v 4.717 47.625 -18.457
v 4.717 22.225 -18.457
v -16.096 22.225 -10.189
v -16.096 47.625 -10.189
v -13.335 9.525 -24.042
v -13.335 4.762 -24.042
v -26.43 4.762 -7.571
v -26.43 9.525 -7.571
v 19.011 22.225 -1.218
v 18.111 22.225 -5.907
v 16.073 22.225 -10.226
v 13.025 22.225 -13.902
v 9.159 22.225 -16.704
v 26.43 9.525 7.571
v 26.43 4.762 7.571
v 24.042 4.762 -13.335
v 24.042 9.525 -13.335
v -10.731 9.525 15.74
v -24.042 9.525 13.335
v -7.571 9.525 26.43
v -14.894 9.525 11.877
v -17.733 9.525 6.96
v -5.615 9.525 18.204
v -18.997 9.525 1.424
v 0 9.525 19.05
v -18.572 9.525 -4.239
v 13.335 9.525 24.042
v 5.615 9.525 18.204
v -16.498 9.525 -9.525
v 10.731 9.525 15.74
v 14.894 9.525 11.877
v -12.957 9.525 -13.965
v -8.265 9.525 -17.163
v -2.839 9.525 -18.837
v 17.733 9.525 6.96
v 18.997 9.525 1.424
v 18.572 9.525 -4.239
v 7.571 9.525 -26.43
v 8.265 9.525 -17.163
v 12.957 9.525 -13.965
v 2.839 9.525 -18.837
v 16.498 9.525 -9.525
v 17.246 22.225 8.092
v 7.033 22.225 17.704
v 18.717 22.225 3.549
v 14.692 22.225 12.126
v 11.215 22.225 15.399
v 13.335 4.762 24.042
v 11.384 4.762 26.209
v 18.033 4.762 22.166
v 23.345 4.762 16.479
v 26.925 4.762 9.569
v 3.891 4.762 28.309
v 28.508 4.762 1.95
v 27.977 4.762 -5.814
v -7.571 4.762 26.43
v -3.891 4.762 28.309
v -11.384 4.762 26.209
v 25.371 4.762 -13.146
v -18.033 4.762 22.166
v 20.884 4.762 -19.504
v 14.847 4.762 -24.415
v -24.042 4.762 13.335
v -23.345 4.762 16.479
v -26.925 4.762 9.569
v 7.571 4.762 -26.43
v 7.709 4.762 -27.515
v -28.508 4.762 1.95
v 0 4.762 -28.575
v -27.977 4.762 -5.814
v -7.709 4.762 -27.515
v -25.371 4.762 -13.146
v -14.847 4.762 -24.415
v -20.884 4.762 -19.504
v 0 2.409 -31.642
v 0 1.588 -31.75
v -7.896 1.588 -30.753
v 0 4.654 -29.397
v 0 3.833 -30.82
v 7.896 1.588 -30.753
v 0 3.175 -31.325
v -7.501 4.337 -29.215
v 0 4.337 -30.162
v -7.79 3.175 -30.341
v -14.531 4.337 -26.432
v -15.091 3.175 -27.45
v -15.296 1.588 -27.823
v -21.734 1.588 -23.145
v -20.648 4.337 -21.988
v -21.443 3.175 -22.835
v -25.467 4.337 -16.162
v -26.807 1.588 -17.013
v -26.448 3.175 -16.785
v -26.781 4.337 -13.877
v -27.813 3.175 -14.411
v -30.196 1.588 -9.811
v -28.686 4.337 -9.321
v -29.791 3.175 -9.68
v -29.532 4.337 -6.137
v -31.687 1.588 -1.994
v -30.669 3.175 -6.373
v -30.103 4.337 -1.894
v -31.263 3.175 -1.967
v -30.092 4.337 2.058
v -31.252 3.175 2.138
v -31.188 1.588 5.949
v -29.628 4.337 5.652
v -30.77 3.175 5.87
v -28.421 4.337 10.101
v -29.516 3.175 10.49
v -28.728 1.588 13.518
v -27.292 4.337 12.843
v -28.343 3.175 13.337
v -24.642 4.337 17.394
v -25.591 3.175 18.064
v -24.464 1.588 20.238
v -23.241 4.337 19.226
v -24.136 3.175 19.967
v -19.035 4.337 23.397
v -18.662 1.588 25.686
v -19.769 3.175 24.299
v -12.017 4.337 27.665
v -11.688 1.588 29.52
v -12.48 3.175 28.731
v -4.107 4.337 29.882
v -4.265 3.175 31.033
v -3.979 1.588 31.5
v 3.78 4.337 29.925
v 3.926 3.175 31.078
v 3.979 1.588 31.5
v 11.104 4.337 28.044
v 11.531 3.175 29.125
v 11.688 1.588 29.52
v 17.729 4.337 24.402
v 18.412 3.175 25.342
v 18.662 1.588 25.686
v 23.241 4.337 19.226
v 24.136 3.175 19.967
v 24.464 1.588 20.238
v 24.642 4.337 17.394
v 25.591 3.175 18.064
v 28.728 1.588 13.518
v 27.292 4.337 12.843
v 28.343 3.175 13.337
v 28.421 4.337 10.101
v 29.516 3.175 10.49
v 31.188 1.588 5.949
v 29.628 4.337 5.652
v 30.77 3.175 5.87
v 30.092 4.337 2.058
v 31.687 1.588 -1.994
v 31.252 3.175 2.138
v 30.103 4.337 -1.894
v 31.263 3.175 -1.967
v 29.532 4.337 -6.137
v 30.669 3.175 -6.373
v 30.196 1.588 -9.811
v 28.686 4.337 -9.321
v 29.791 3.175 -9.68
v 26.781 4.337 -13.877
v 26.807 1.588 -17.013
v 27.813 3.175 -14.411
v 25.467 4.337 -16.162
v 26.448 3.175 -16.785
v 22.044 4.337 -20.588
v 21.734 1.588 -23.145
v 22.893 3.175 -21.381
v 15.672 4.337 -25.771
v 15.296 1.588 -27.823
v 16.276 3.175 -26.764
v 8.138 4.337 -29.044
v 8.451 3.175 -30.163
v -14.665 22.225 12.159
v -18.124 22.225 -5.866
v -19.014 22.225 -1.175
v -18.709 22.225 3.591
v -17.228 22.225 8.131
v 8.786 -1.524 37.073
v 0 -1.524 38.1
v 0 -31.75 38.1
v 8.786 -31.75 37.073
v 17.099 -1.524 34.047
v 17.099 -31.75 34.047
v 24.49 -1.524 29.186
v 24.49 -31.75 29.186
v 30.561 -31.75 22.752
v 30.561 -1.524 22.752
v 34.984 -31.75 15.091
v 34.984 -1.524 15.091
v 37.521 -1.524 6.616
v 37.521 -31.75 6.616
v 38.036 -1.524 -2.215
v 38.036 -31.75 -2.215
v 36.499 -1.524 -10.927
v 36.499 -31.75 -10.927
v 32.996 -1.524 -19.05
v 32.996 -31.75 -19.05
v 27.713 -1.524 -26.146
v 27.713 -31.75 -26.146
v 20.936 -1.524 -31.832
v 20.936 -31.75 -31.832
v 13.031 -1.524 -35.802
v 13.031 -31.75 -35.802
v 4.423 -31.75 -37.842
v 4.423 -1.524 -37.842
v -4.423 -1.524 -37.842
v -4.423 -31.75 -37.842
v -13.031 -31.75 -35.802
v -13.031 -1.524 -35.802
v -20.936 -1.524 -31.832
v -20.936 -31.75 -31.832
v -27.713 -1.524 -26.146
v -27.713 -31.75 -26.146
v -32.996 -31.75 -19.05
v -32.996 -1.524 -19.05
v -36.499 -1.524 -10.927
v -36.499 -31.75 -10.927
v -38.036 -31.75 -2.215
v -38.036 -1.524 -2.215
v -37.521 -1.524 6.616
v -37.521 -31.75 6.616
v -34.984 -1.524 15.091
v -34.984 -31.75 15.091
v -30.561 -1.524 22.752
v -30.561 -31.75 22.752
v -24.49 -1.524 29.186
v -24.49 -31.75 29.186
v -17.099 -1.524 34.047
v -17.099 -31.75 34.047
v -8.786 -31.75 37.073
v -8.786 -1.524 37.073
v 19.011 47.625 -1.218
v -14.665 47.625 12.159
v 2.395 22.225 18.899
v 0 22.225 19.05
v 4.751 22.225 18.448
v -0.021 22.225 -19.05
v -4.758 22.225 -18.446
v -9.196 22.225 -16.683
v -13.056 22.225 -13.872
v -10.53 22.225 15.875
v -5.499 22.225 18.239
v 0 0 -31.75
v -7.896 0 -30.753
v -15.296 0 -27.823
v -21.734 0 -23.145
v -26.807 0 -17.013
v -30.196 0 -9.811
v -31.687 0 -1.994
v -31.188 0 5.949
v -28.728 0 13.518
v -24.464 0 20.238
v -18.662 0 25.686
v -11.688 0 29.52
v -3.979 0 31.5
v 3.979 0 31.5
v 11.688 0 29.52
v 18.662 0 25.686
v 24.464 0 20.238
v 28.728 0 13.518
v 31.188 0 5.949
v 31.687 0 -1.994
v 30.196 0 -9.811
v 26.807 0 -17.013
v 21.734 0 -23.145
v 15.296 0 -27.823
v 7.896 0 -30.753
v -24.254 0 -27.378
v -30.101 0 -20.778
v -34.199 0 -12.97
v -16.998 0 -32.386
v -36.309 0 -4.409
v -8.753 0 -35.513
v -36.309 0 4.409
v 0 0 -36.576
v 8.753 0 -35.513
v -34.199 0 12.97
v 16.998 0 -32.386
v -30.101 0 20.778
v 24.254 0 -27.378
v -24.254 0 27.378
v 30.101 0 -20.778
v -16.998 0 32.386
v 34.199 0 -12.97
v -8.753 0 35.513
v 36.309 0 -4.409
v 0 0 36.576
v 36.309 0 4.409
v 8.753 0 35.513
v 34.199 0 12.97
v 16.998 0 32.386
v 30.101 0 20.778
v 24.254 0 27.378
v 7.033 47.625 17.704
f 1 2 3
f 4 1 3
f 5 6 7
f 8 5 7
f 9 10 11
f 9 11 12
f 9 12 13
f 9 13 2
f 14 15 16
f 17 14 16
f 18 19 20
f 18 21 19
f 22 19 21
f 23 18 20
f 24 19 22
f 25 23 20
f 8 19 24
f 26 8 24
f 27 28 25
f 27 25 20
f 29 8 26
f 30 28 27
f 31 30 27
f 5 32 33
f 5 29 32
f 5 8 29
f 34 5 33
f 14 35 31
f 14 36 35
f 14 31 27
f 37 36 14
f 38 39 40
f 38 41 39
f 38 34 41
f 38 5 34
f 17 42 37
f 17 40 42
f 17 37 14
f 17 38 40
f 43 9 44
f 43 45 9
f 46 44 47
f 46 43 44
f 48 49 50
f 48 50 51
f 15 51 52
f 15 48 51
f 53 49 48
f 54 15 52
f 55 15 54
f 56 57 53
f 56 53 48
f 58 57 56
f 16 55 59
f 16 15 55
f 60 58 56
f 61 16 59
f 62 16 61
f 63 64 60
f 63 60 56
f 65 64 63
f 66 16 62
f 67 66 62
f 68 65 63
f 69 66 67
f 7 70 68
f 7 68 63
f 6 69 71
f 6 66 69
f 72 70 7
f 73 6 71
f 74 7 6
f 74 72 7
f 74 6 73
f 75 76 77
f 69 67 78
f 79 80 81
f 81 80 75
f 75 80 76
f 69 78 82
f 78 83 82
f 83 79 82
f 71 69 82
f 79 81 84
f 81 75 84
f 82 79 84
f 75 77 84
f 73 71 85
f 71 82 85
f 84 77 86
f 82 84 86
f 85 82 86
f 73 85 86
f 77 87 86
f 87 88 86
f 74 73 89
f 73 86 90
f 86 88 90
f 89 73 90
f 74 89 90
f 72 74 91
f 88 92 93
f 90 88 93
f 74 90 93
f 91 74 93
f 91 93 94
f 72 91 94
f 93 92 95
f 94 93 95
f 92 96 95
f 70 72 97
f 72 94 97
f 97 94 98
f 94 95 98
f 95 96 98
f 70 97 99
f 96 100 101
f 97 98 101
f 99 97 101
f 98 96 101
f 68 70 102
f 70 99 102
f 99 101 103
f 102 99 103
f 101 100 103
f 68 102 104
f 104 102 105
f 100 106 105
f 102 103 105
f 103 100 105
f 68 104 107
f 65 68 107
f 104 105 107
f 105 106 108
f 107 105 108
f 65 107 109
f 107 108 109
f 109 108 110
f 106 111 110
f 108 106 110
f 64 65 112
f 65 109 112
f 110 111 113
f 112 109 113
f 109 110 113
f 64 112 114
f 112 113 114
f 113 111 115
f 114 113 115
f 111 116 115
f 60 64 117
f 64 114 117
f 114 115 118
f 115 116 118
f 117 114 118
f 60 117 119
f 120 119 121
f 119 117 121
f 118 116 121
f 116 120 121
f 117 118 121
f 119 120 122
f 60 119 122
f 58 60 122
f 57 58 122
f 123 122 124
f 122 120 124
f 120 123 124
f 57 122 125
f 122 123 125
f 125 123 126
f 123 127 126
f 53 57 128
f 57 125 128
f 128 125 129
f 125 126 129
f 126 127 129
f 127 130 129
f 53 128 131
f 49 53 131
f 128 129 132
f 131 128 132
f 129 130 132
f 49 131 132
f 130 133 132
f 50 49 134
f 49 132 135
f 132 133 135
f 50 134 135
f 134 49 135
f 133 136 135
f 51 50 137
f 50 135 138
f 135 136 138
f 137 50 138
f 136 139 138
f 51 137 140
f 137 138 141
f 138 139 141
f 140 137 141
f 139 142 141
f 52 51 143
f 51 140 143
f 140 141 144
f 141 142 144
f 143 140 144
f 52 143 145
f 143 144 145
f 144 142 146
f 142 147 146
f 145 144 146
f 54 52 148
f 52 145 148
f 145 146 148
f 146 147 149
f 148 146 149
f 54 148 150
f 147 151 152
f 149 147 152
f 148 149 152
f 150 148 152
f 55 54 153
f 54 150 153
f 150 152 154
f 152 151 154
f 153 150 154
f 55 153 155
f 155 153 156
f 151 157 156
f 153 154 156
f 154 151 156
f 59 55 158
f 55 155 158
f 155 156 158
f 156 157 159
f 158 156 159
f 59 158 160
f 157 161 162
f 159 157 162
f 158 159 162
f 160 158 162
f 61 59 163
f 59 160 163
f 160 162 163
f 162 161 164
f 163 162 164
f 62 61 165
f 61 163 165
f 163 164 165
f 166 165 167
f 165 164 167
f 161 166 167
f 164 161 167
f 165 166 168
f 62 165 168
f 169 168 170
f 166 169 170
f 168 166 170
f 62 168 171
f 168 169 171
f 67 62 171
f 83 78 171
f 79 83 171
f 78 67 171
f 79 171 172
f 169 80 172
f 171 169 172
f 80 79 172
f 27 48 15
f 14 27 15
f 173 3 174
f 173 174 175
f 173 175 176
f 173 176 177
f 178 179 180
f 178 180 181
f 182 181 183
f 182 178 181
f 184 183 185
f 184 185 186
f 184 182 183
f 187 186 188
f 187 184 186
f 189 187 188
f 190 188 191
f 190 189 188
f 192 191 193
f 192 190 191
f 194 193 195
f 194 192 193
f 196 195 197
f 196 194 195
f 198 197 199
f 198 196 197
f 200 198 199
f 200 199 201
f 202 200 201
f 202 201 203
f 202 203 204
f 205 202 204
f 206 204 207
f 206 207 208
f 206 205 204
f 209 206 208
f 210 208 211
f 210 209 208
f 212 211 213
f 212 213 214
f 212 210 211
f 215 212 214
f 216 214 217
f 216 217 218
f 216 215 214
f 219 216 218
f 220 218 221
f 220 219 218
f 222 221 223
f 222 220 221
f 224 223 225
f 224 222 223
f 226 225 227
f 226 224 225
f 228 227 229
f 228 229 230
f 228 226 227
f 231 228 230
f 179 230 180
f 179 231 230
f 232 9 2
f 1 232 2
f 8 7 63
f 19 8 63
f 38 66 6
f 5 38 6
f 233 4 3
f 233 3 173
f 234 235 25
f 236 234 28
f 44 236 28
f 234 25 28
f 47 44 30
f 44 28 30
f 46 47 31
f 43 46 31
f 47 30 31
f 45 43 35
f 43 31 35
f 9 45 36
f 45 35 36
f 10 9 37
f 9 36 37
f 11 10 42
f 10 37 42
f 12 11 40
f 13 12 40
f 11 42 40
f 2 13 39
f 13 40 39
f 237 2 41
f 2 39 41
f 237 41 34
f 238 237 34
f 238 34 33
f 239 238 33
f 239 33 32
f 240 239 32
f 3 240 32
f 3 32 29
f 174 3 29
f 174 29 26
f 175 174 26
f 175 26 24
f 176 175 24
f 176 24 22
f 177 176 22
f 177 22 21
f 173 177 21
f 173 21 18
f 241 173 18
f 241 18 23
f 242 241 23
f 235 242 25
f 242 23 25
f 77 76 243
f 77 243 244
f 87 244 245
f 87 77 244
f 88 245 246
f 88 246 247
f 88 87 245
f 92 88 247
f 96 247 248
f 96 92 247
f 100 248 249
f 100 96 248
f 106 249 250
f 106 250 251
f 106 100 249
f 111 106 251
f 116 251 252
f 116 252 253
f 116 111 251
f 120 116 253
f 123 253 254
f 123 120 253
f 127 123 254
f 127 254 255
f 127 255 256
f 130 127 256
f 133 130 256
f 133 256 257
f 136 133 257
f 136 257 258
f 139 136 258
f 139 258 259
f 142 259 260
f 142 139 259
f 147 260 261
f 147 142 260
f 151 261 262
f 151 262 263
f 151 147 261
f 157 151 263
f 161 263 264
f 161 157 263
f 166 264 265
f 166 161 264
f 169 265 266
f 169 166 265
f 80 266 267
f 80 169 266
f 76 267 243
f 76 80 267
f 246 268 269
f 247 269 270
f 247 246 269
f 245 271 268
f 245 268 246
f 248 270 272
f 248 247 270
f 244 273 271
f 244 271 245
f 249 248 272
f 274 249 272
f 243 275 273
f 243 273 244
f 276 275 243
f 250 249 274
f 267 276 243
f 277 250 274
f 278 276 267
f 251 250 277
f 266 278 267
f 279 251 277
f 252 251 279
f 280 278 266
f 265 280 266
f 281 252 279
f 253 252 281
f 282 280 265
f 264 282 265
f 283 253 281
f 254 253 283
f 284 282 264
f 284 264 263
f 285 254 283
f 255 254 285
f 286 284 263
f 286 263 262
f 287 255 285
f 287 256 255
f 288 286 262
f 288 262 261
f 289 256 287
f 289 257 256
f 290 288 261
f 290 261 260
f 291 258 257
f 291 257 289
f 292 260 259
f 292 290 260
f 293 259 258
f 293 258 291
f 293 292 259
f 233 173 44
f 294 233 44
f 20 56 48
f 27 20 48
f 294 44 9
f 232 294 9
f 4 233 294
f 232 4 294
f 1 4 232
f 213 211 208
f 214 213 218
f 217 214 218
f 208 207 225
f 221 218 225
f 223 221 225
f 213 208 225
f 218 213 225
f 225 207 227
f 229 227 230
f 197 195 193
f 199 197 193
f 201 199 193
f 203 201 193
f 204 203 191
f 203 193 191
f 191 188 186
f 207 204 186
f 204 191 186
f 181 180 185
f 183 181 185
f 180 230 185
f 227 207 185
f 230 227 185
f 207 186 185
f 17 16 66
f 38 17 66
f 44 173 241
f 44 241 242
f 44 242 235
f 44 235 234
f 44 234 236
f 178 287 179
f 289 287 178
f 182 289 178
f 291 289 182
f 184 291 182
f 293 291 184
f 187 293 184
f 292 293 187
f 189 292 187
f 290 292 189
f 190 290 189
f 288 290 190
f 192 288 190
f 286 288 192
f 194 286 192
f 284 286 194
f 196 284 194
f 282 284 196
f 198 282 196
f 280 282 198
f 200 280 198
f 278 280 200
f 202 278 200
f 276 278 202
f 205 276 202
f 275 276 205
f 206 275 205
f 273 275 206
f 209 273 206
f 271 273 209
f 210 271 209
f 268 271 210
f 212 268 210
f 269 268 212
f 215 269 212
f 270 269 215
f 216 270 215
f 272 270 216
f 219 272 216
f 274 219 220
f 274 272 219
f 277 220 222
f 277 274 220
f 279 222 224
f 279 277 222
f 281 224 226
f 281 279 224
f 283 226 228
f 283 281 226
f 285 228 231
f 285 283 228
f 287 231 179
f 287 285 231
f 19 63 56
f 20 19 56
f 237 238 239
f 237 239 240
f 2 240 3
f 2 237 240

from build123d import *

# Parameters (mm, degrees)
SKETCH1_R           = 38.1
BOSS_EXTRUDE1_DEPTH = 31.75
CHAMFER1_SIZE       = 1.524
SKETCH2_R           = 31.75
BOSS_EXTRUDE3_DEPTH = 4.7625
BOSS_EXTRUDE4_DEPTH = 9.525
SKETCH5_R           = 19.05
BOSS_EXTRUDE5_DEPTH = 12.7
BOSS_EXTRUDE6_DEPTH = 25.4
FILLET2_R           = 3.175


with BuildPart() as part:
    # Sketch1 → Boss-Extrude1 (new body)
    with BuildSketch(Plane(origin=(0, 0, 0), x_dir=(1, 0, 0), z_dir=(0, 1, 0))):
        with Locations(Location((0, 0, 0), (0, 0, 270))):
            Circle(SKETCH1_R)
    extrude(amount=-BOSS_EXTRUDE1_DEPTH)

    # Chamfer1
    chamfer1_edges = [part.edges().sort_by_distance(p)[0] for p in [
        (0, 0, -38.1),
    ]]
    chamfer(chamfer1_edges, length=CHAMFER1_SIZE)

    # Sketch2 → Boss-Extrude3 (add, symmetric)
    with BuildSketch(Plane(origin=(0, 0, 0), x_dir=(1, 0, 0), z_dir=(0, 1, 0))):
        with Locations(Location((0, 0, 0), (0, 0, 90))):
            Circle(SKETCH2_R)
    extrude(amount=BOSS_EXTRUDE3_DEPTH, both=True)

    # Sketch4 → Boss-Extrude4 (add)
    with BuildSketch(Plane(origin=(0, 0, 0), x_dir=(1, 0, 0), z_dir=(0, 1, 0))):
        Polygon((7.571021609, 26.429748164), (-13.335133431, 24.042174872), (-26.429748164, 7.571021609), (-24.042174872, -13.335133431), (-7.571021609, -26.429748164), (13.335133431, -24.042174872), (26.429748164, -7.571021609), (24.042174872, 13.335133431), align=None)
    extrude(amount=BOSS_EXTRUDE4_DEPTH)

    # Sketch5 → Boss-Extrude5 (add)
    with BuildSketch(Plane(origin=(0, 9.525, 0), x_dir=(1, 0, 0), z_dir=(0, 1, 0))):
        with Locations(Location((0, 0, 0), (0, 0, 270))):
            Circle(SKETCH5_R)
    extrude(amount=BOSS_EXTRUDE5_DEPTH)

    # Sketch6 → Boss-Extrude6 (add)
    with BuildSketch(Plane(origin=(0, 22.225, 0), x_dir=(1, 0, 0), z_dir=(0, 1, 0))):
        Polygon((4.716746996, 18.456836072), (-16.095939236, 10.189368975), (-14.664584525, -12.159459721), (7.032727569, -17.704328367), (19.011049196, 1.217583042), align=None)
    extrude(amount=BOSS_EXTRUDE6_DEPTH)

    # Fillet2
    fillet2_edges = [part.edges().sort_by_distance(p)[0] for p in [
        (0, 4.7625, 31.75),
    ]]
    fillet(fillet2_edges, radius=FILLET2_R)


solid = part.part
